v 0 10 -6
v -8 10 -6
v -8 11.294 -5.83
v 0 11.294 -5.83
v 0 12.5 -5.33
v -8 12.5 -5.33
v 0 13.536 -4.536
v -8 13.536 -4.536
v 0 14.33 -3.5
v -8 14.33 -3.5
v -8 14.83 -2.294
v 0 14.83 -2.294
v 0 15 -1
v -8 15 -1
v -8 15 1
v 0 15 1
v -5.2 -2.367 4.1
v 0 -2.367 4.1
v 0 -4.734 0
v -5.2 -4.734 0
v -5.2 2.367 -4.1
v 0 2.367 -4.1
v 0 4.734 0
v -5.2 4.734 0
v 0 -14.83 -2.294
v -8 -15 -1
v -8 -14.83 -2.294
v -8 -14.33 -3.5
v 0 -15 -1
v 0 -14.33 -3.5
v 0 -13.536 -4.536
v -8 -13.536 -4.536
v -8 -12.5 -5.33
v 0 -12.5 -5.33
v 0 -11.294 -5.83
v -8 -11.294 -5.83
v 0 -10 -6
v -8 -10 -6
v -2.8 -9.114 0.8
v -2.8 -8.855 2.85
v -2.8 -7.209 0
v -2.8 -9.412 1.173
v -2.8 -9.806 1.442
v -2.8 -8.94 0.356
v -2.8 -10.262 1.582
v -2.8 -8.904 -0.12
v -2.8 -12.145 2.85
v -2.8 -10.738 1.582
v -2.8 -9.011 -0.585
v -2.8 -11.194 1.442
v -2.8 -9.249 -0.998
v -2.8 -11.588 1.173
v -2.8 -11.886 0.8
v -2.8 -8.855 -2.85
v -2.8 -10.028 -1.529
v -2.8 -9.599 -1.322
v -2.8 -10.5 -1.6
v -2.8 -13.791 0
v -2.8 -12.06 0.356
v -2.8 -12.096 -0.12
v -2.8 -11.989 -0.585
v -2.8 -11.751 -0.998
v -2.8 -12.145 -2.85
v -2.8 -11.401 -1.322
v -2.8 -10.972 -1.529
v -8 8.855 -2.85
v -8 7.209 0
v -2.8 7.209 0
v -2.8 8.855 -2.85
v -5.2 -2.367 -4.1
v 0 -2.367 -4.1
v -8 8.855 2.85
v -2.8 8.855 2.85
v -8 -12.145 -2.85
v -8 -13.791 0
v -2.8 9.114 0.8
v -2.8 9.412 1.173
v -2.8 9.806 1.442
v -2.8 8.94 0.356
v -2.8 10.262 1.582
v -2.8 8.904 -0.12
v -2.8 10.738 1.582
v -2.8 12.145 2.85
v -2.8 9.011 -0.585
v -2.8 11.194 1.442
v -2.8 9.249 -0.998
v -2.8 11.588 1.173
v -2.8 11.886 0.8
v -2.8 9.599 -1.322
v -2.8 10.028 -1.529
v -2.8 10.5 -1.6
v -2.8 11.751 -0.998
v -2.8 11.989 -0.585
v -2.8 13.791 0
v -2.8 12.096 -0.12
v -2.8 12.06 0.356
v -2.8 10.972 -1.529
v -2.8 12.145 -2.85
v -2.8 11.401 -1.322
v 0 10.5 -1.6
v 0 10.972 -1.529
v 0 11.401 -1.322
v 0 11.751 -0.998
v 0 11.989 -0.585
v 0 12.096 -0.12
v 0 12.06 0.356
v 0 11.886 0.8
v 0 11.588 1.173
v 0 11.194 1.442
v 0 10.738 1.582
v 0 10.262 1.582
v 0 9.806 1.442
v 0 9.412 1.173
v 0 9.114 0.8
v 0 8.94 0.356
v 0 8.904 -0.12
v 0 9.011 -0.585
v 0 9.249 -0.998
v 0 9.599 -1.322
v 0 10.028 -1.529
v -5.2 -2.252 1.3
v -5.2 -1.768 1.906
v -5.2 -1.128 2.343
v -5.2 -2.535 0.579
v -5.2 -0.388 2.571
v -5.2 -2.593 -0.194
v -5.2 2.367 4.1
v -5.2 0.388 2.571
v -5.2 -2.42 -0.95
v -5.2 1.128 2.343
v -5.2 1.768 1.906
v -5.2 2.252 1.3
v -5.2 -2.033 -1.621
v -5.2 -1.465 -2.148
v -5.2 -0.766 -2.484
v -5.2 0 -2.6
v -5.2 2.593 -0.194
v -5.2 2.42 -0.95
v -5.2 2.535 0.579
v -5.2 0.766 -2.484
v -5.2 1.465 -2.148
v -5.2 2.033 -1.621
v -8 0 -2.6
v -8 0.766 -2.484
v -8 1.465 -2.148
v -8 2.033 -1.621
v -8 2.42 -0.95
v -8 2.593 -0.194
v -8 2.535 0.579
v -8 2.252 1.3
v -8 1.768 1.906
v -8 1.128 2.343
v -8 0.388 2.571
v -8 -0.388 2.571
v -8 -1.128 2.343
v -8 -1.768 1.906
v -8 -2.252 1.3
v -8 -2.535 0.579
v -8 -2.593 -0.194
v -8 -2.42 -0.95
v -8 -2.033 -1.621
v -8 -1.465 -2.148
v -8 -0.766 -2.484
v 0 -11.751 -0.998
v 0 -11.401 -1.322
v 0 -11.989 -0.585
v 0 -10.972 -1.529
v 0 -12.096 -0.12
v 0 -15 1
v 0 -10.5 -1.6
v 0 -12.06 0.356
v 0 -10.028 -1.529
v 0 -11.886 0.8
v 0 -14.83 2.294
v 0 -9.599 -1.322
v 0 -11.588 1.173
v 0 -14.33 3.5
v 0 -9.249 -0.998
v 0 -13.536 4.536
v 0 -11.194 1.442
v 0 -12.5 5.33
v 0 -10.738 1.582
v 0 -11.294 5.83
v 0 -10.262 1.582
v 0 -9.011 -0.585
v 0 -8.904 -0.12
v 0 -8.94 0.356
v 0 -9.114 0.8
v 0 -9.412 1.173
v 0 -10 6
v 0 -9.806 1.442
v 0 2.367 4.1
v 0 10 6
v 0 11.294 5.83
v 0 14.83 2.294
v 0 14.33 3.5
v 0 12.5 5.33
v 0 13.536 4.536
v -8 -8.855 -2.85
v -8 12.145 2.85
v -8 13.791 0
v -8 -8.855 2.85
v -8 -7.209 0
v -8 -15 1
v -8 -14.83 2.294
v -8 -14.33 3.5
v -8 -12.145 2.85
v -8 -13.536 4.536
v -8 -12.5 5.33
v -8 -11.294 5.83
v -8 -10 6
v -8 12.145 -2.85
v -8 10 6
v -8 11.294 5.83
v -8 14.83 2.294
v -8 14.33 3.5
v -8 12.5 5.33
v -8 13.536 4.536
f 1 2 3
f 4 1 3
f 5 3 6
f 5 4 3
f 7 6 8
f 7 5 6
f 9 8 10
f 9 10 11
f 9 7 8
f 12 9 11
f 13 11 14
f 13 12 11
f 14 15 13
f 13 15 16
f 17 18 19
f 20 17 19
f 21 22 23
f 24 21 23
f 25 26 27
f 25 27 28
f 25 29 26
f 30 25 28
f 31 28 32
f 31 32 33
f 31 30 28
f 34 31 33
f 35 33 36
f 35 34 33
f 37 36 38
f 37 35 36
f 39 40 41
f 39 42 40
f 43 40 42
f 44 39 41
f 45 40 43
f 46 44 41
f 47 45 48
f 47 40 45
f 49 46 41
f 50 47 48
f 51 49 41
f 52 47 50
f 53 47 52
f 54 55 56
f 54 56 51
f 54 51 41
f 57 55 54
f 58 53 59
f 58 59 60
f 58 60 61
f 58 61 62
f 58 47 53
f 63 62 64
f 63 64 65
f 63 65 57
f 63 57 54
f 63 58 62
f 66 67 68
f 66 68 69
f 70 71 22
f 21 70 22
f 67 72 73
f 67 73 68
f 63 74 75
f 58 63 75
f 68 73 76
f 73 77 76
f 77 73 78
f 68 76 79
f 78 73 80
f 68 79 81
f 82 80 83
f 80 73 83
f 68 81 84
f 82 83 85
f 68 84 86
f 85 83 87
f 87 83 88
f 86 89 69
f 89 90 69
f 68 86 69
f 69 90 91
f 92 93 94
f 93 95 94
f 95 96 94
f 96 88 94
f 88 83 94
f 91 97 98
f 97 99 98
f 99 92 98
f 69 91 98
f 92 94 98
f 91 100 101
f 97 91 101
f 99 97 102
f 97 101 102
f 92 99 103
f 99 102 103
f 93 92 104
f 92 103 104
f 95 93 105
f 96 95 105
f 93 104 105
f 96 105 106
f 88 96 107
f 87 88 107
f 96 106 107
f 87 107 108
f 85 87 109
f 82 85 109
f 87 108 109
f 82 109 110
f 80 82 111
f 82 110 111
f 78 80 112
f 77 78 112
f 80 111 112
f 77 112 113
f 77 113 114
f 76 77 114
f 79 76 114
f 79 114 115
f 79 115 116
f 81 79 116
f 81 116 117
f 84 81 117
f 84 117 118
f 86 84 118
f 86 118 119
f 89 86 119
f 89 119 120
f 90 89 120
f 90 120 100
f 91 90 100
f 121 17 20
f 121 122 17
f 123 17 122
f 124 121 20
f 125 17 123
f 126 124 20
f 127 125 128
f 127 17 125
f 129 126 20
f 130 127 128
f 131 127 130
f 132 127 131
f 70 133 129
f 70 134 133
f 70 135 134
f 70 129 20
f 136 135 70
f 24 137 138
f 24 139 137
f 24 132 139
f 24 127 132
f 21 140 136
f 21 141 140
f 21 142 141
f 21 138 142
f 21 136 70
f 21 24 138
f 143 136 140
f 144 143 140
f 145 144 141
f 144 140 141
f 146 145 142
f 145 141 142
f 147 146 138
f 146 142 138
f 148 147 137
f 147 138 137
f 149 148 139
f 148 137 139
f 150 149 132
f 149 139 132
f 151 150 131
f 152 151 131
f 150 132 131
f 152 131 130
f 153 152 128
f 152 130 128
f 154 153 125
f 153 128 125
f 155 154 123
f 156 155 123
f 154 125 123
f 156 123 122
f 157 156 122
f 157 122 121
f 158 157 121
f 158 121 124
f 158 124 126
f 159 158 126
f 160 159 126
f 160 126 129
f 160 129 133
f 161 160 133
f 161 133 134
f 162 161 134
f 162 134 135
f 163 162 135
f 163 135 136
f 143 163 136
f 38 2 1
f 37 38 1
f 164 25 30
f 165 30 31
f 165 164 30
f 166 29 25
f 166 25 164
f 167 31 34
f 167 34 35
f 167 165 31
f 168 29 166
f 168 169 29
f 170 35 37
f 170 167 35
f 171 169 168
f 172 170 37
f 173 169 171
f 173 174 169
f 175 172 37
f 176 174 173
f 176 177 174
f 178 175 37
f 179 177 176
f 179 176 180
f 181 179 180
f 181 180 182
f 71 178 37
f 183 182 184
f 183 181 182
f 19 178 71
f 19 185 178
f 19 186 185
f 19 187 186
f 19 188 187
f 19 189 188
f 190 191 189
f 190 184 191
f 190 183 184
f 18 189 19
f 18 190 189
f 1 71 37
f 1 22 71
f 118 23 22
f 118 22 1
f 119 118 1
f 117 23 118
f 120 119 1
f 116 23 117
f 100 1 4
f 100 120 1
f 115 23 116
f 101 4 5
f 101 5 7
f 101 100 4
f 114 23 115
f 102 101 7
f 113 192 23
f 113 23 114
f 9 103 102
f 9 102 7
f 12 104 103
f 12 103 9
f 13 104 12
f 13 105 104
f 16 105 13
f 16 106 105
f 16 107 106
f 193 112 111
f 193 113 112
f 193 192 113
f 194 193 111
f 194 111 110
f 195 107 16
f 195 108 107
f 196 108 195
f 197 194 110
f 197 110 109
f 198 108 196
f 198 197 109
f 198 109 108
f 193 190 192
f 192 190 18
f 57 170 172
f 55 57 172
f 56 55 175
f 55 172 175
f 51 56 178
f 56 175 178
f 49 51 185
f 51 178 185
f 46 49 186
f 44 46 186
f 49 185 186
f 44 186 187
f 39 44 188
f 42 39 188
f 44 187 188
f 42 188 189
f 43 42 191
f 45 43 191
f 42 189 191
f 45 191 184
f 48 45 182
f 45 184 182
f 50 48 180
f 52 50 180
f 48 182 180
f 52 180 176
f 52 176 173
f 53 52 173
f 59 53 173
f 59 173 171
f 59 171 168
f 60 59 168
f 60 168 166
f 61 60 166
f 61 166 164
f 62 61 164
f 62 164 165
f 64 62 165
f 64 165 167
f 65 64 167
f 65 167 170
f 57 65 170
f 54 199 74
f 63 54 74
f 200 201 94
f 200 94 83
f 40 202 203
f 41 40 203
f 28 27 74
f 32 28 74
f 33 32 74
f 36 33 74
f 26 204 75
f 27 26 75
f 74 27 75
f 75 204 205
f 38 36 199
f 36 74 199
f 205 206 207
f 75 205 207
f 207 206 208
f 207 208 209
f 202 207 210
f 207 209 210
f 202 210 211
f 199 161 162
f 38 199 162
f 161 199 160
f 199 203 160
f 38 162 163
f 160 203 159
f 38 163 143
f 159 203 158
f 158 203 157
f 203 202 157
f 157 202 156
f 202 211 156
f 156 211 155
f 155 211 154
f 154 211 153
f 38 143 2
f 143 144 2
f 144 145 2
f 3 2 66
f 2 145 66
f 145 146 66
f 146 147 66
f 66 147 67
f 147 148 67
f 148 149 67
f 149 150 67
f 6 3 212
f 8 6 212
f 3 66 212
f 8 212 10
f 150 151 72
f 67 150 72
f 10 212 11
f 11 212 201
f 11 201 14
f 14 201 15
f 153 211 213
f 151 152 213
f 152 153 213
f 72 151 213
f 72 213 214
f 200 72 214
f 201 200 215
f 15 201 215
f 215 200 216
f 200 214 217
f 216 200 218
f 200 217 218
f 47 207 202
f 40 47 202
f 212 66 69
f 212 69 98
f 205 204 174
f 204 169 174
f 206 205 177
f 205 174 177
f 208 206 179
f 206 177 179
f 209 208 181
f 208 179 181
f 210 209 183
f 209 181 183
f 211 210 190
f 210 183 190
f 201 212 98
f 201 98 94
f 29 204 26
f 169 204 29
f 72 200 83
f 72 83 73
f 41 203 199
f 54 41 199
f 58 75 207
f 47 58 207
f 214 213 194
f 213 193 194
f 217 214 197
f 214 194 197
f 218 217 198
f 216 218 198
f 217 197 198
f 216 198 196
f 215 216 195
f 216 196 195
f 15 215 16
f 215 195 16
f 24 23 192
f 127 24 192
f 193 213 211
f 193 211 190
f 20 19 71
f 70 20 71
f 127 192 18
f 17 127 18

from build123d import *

# Parameters (mm, degrees)
SKIZZE1_W                       = 8
SKIZZE1_H                       = 30
AUFSATZ_LINEAR_AUSTRAGEN1_DEPTH = 6
SCHNITT_LINEAR_AUSTRAGEN3_DEPTH = 5.2
SCHNITT_LINEAR_START            = -8
SCHNITT_LINEAR_AUSTRAGEN2_DEPTH = 5.2
SKIZZE4_R                       = 1.6
SKIZZE4_R_2                     = 2.6
SCHNITT_LINEAR_AUSTRAGEN4_DEPTH = 19.027756377
VERRUNDUNG1_R                   = 5


with BuildPart() as part:
    # Skizze1 → Aufsatz-Linear austragen1 (new, symmetric)
    with BuildSketch(Plane.XY):
        with Locations((-4, 0)):
            Rectangle(SKIZZE1_W, SKIZZE1_H)
    extrude(amount=AUFSATZ_LINEAR_AUSTRAGEN1_DEPTH, both=True)

    # Skizze2 → Schnitt-Linear austragen3 (cut)
    with BuildSketch(Plane(origin=(0, 0, 0), x_dir=(0, 0, -1), z_dir=(1, 0, 0))):
        Polygon((0, 4.734272207), (-4.1, 2.367136104), (-4.1, -2.367136104), (0, -4.734272207), (4.1, -2.367136104), (4.1, 2.367136104), align=None)
    extrude(amount=-SCHNITT_LINEAR_AUSTRAGEN3_DEPTH, mode=Mode.SUBTRACT)

    # Skizze3 → Schnitt-Linear austragen2 (cut)
    with BuildSketch(Plane(origin=(0, 0, 0), x_dir=(0, 0, -1), z_dir=(1, 0, 0)).offset(SCHNITT_LINEAR_START)):
        Polygon((2.85, 8.854551733), (2.85, 12.145448267), (0, 13.790896534), (-2.85, 12.145448267), (-2.85, 8.854551733), (0, 7.209103466), align=None)
    schnitt_linear_austragen2 = extrude(amount=SCHNITT_LINEAR_AUSTRAGEN2_DEPTH, mode=Mode.SUBTRACT)

    # Skizze4 → Schnitt-Linear austragen4 (cut, through all)
    with BuildSketch(Plane(origin=(0, 0, 0), x_dir=(0, 0, -1), z_dir=(1, 0, 0))):
        with Locations((0, 10.5)):
            Circle(SKIZZE4_R)
        with Locations((0, -10.5)):
            Circle(SKIZZE4_R)
        Circle(SKIZZE4_R_2)
    extrude(amount=-SCHNITT_LINEAR_AUSTRAGEN4_DEPTH, mode=Mode.SUBTRACT)

    # Spiegeln1: Schnitt-Linear austragen2 across plane
    add(schnitt_linear_austragen2.mirror(Plane.ZX), mode=Mode.SUBTRACT)

    # Verrundung1
    verrundung1_edges = [part.edges().sort_by_distance(p)[0] for p in [
        (-4, -15, 6),
        (-4, -15, -6),
        (-4, 15, -6),
        (-4, 15, 6),
    ]]
    fillet(verrundung1_edges, radius=VERRUNDUNG1_R)


solid = part.part
